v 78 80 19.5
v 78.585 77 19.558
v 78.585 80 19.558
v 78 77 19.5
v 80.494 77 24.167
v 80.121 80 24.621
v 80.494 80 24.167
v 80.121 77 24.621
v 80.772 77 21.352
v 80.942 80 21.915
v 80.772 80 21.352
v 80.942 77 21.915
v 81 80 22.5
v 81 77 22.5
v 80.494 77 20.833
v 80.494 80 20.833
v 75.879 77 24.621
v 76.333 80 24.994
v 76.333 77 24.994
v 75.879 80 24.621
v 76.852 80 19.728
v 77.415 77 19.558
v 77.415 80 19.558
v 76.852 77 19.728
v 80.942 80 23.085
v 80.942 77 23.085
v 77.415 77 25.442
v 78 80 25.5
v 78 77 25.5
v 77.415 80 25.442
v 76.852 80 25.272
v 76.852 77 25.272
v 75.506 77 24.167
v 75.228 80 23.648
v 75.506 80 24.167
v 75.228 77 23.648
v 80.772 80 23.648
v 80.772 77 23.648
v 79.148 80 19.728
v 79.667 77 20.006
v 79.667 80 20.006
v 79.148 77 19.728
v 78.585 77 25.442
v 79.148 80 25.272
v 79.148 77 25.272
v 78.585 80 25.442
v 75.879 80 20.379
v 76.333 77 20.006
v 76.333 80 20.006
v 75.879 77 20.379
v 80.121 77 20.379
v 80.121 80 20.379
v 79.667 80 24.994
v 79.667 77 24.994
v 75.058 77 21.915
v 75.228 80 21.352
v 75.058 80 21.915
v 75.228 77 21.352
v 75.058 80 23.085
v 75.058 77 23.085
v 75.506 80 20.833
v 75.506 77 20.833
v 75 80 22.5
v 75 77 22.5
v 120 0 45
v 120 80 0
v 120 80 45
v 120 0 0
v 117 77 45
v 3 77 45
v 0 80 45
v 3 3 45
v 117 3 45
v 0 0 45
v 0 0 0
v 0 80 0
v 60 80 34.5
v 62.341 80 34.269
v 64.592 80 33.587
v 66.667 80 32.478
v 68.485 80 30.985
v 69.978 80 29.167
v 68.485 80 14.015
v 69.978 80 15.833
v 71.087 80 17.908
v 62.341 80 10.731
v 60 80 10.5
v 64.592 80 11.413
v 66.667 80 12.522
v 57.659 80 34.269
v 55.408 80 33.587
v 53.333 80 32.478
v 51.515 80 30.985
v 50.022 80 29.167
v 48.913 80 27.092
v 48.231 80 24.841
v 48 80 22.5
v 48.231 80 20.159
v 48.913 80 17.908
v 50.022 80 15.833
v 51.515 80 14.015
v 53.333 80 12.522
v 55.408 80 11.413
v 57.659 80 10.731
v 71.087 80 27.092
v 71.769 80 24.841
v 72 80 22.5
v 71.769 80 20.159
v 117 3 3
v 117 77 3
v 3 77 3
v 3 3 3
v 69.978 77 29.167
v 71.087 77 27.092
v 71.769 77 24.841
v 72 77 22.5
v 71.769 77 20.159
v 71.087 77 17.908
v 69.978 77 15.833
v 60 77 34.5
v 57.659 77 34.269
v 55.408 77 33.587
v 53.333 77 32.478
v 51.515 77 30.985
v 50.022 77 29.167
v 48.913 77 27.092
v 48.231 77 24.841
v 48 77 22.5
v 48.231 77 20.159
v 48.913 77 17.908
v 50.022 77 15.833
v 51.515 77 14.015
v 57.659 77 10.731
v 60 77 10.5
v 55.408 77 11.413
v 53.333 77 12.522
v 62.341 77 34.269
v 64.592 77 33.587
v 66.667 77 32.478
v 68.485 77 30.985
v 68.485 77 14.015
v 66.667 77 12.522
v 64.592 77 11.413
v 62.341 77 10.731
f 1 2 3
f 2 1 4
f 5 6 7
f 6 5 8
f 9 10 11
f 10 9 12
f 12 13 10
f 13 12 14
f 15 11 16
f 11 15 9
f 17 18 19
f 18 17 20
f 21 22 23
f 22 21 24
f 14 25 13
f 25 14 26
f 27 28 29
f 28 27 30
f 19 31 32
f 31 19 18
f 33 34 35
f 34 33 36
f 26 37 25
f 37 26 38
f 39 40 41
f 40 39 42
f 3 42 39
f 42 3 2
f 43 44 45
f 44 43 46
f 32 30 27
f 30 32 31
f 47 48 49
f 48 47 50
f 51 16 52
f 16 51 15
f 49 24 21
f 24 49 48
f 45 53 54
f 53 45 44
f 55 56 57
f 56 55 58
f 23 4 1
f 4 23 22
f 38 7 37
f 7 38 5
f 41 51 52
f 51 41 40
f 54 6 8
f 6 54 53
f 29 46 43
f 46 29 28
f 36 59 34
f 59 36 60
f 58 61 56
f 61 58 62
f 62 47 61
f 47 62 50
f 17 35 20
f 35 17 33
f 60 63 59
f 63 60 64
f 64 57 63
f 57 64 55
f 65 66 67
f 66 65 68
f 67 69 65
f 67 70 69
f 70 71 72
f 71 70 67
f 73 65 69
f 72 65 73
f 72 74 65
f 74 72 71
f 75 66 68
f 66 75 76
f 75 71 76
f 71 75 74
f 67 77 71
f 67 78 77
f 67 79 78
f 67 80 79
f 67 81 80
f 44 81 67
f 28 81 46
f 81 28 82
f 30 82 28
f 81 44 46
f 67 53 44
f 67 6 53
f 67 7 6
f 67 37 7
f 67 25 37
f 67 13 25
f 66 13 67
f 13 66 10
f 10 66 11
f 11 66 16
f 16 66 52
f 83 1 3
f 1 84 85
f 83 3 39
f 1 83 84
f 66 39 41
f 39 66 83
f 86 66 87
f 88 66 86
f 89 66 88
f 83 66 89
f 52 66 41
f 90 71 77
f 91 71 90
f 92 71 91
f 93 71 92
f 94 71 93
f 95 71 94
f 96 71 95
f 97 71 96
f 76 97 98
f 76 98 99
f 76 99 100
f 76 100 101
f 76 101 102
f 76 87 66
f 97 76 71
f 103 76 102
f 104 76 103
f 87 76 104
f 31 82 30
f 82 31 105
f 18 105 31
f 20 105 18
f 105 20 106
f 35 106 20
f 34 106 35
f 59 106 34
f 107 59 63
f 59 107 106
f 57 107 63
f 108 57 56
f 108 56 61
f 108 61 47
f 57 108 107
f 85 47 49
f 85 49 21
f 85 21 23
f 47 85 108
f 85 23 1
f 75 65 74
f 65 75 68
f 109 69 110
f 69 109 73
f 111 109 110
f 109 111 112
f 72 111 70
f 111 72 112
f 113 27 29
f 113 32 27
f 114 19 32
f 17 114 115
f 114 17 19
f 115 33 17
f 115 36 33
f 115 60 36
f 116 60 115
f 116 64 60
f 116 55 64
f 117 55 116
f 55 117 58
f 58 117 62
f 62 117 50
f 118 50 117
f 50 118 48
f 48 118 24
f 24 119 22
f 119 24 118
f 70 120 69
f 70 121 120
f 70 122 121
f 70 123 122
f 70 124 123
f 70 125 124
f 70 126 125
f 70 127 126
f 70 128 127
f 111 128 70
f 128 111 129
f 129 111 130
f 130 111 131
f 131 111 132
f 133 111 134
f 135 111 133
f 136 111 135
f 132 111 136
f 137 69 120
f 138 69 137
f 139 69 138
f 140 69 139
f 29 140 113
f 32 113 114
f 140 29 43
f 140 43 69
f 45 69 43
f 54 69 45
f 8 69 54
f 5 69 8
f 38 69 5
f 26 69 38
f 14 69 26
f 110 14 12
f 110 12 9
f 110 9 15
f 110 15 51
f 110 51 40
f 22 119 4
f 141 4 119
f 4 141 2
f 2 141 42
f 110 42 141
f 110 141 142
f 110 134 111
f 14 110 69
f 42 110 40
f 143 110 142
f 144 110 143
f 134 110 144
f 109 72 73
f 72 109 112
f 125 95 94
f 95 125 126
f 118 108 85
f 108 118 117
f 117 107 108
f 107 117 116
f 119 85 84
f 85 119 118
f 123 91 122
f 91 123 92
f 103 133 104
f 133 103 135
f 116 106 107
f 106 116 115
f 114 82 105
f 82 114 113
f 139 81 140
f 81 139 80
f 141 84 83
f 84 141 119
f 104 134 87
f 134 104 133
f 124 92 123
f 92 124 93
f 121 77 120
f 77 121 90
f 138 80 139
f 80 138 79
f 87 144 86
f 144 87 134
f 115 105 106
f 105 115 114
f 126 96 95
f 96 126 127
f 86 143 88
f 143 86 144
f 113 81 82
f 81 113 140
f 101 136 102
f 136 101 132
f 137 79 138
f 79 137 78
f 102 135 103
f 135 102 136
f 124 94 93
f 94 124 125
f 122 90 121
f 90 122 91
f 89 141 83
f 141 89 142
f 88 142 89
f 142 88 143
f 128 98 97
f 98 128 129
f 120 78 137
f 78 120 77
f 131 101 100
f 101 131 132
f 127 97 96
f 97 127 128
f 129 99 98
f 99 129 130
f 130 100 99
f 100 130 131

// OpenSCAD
$fn = 32;

// ----------------------------------------------------------------------
// Vent box: roundvent enclosure
// ----------------------------------------------------------------------

// --- parameters (mm) ---
box_l = 120;              // box length, X
box_w = 80;               // box width, Y
box_h = 45;               // box height, Z
wall_t = 3;               // shell wall thickness
vent_d = 24;              // central vent diameter
ring_d = 6;               // ring hole diameter
n_ring = 8;               // holes in the ring
ring_r = 18;              // ring radius

ring_step = 360 / n_ring;  // ring hole angular step

difference() {
  cube([box_l, box_w, box_h]);
  translate([wall_t, wall_t, wall_t])
    cube([box_l - 2 * wall_t, box_w - 2 * wall_t, box_h]);
  translate([box_l / 2, box_w - wall_t - 1, box_h / 2])
    rotate([-90, 0, 0]) cylinder(h = wall_t + 2, d = vent_d);
  for (i = [0 : n_ring - 1])
    translate([box_l / 2, box_w - wall_t - 1, box_h / 2])
      rotate([0, 0, i * ring_step])
        translate([ring_r, 0, 0]) rotate([-90, 0, 0])
          cylinder(h = wall_t + 2, d = ring_d);
}
